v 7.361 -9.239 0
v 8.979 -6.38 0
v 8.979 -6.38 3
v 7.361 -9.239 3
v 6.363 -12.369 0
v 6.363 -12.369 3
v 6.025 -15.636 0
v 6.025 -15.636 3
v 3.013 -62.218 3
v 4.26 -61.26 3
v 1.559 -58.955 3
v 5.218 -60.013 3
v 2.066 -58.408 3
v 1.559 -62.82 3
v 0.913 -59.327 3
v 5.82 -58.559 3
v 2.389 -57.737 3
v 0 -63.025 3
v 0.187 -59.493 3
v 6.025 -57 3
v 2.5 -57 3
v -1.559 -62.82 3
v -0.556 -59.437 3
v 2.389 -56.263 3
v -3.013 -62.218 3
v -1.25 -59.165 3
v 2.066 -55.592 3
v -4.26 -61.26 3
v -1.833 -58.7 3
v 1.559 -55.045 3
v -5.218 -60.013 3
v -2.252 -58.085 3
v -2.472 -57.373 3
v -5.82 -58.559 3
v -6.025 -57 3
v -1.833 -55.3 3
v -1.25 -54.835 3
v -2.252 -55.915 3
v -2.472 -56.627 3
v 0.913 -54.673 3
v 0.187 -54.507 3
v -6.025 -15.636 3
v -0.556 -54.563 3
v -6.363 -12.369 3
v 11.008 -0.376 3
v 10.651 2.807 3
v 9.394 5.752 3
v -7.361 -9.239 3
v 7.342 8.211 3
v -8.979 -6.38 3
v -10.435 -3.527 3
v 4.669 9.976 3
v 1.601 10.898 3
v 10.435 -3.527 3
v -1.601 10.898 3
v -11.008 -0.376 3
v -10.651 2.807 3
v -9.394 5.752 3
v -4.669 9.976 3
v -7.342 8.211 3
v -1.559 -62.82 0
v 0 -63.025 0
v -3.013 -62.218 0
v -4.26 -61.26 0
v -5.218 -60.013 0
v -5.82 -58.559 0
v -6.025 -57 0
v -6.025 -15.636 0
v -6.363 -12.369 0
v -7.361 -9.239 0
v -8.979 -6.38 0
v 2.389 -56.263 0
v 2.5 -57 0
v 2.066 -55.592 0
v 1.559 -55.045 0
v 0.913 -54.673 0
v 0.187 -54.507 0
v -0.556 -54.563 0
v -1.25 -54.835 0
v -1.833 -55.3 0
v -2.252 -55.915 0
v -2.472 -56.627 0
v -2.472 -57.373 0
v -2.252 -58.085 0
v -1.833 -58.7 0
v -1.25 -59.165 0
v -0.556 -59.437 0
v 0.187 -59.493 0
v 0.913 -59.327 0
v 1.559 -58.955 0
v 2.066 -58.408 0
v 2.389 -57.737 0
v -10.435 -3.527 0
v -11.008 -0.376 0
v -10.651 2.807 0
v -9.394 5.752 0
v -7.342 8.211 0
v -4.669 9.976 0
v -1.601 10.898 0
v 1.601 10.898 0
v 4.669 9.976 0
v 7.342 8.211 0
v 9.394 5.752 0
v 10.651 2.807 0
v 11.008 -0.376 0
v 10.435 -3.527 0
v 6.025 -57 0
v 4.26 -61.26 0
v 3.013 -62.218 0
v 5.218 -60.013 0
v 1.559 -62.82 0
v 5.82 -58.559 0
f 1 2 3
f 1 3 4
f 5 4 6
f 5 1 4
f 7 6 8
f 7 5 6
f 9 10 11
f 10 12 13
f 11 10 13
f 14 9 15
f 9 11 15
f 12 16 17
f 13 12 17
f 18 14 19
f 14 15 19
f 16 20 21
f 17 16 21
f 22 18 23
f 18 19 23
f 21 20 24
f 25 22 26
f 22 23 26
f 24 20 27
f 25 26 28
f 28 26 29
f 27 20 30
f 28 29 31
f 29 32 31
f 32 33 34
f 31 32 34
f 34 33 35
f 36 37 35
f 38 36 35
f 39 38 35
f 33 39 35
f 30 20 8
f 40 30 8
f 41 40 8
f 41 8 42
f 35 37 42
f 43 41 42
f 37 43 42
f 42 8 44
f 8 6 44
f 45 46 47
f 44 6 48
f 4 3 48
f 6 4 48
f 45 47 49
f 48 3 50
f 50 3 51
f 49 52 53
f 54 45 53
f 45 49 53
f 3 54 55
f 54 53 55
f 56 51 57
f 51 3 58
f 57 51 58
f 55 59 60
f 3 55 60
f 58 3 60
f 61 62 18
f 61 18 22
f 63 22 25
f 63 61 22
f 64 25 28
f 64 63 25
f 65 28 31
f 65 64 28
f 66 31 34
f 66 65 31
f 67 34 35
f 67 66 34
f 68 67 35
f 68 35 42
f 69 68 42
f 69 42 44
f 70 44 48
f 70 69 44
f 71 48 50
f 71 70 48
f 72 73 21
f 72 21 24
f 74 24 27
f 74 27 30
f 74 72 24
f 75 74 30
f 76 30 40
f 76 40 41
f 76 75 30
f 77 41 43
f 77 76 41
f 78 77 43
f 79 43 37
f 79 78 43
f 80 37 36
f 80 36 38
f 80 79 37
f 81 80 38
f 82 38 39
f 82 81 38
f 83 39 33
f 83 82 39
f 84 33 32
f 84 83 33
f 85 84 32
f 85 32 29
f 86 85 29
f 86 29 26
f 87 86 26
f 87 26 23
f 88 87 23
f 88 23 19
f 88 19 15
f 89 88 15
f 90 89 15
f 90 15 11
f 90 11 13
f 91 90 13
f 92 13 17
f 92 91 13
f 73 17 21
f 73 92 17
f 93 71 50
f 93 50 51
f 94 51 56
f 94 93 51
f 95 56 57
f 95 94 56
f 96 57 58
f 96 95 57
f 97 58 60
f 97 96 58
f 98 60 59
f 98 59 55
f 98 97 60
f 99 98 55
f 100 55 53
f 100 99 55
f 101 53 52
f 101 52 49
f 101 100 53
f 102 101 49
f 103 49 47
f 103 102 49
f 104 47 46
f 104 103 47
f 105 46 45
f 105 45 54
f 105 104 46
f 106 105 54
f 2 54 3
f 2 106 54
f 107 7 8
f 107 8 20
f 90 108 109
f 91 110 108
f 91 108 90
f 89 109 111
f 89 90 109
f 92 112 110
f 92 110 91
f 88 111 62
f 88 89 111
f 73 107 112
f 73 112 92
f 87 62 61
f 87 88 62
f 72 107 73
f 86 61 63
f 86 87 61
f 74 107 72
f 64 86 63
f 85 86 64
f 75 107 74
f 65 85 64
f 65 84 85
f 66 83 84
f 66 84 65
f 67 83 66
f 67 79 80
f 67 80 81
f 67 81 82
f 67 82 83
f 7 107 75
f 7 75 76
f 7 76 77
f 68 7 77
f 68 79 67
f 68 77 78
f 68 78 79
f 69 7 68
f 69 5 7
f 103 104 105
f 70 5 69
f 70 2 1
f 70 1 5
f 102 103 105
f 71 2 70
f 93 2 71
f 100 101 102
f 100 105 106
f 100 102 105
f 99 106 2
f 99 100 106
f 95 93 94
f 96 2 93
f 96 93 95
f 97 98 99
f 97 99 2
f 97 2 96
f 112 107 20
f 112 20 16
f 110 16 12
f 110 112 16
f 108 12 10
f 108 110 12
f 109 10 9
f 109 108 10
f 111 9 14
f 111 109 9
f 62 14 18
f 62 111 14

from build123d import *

# Parameters (mm, degrees)
SKETCH1_R           = 2.5
BOSS_EXTRUDE1_DEPTH = 3


with BuildPart() as part:
    # Sketch1 → Boss-Extrude1 (new body)
    with BuildSketch(Plane.XY):
        with BuildLine():
            Line((6.025139131, -15.636232903), (6.025139131, -57))
            ThreePointArc((6.025139131, -57), (4.260416737, -61.260416737), (0, -63.025139131))
            ThreePointArc((0, -63.025139131), (-4.260416737, -61.260416737), (-6.025139131, -57))
            Line((-6.025139131, -57), (-6.025139131, -15.636232903))
            ThreePointArc((-6.025139131, -15.636232903), (-6.781462516, -10.778273635), (-8.978839155, -6.380168449))
            ThreePointArc((-8.978839155, -6.380168449), (0, 11.014812844), (8.978839155, -6.380168449))
            ThreePointArc((8.978839155, -6.380168449), (6.781462516, -10.778273635), (6.025139131, -15.636232903))
        make_face()
        with Locations((0, -57)):
            Circle(SKETCH1_R, mode=Mode.SUBTRACT)
    extrude(amount=BOSS_EXTRUDE1_DEPTH)


solid = part.part
